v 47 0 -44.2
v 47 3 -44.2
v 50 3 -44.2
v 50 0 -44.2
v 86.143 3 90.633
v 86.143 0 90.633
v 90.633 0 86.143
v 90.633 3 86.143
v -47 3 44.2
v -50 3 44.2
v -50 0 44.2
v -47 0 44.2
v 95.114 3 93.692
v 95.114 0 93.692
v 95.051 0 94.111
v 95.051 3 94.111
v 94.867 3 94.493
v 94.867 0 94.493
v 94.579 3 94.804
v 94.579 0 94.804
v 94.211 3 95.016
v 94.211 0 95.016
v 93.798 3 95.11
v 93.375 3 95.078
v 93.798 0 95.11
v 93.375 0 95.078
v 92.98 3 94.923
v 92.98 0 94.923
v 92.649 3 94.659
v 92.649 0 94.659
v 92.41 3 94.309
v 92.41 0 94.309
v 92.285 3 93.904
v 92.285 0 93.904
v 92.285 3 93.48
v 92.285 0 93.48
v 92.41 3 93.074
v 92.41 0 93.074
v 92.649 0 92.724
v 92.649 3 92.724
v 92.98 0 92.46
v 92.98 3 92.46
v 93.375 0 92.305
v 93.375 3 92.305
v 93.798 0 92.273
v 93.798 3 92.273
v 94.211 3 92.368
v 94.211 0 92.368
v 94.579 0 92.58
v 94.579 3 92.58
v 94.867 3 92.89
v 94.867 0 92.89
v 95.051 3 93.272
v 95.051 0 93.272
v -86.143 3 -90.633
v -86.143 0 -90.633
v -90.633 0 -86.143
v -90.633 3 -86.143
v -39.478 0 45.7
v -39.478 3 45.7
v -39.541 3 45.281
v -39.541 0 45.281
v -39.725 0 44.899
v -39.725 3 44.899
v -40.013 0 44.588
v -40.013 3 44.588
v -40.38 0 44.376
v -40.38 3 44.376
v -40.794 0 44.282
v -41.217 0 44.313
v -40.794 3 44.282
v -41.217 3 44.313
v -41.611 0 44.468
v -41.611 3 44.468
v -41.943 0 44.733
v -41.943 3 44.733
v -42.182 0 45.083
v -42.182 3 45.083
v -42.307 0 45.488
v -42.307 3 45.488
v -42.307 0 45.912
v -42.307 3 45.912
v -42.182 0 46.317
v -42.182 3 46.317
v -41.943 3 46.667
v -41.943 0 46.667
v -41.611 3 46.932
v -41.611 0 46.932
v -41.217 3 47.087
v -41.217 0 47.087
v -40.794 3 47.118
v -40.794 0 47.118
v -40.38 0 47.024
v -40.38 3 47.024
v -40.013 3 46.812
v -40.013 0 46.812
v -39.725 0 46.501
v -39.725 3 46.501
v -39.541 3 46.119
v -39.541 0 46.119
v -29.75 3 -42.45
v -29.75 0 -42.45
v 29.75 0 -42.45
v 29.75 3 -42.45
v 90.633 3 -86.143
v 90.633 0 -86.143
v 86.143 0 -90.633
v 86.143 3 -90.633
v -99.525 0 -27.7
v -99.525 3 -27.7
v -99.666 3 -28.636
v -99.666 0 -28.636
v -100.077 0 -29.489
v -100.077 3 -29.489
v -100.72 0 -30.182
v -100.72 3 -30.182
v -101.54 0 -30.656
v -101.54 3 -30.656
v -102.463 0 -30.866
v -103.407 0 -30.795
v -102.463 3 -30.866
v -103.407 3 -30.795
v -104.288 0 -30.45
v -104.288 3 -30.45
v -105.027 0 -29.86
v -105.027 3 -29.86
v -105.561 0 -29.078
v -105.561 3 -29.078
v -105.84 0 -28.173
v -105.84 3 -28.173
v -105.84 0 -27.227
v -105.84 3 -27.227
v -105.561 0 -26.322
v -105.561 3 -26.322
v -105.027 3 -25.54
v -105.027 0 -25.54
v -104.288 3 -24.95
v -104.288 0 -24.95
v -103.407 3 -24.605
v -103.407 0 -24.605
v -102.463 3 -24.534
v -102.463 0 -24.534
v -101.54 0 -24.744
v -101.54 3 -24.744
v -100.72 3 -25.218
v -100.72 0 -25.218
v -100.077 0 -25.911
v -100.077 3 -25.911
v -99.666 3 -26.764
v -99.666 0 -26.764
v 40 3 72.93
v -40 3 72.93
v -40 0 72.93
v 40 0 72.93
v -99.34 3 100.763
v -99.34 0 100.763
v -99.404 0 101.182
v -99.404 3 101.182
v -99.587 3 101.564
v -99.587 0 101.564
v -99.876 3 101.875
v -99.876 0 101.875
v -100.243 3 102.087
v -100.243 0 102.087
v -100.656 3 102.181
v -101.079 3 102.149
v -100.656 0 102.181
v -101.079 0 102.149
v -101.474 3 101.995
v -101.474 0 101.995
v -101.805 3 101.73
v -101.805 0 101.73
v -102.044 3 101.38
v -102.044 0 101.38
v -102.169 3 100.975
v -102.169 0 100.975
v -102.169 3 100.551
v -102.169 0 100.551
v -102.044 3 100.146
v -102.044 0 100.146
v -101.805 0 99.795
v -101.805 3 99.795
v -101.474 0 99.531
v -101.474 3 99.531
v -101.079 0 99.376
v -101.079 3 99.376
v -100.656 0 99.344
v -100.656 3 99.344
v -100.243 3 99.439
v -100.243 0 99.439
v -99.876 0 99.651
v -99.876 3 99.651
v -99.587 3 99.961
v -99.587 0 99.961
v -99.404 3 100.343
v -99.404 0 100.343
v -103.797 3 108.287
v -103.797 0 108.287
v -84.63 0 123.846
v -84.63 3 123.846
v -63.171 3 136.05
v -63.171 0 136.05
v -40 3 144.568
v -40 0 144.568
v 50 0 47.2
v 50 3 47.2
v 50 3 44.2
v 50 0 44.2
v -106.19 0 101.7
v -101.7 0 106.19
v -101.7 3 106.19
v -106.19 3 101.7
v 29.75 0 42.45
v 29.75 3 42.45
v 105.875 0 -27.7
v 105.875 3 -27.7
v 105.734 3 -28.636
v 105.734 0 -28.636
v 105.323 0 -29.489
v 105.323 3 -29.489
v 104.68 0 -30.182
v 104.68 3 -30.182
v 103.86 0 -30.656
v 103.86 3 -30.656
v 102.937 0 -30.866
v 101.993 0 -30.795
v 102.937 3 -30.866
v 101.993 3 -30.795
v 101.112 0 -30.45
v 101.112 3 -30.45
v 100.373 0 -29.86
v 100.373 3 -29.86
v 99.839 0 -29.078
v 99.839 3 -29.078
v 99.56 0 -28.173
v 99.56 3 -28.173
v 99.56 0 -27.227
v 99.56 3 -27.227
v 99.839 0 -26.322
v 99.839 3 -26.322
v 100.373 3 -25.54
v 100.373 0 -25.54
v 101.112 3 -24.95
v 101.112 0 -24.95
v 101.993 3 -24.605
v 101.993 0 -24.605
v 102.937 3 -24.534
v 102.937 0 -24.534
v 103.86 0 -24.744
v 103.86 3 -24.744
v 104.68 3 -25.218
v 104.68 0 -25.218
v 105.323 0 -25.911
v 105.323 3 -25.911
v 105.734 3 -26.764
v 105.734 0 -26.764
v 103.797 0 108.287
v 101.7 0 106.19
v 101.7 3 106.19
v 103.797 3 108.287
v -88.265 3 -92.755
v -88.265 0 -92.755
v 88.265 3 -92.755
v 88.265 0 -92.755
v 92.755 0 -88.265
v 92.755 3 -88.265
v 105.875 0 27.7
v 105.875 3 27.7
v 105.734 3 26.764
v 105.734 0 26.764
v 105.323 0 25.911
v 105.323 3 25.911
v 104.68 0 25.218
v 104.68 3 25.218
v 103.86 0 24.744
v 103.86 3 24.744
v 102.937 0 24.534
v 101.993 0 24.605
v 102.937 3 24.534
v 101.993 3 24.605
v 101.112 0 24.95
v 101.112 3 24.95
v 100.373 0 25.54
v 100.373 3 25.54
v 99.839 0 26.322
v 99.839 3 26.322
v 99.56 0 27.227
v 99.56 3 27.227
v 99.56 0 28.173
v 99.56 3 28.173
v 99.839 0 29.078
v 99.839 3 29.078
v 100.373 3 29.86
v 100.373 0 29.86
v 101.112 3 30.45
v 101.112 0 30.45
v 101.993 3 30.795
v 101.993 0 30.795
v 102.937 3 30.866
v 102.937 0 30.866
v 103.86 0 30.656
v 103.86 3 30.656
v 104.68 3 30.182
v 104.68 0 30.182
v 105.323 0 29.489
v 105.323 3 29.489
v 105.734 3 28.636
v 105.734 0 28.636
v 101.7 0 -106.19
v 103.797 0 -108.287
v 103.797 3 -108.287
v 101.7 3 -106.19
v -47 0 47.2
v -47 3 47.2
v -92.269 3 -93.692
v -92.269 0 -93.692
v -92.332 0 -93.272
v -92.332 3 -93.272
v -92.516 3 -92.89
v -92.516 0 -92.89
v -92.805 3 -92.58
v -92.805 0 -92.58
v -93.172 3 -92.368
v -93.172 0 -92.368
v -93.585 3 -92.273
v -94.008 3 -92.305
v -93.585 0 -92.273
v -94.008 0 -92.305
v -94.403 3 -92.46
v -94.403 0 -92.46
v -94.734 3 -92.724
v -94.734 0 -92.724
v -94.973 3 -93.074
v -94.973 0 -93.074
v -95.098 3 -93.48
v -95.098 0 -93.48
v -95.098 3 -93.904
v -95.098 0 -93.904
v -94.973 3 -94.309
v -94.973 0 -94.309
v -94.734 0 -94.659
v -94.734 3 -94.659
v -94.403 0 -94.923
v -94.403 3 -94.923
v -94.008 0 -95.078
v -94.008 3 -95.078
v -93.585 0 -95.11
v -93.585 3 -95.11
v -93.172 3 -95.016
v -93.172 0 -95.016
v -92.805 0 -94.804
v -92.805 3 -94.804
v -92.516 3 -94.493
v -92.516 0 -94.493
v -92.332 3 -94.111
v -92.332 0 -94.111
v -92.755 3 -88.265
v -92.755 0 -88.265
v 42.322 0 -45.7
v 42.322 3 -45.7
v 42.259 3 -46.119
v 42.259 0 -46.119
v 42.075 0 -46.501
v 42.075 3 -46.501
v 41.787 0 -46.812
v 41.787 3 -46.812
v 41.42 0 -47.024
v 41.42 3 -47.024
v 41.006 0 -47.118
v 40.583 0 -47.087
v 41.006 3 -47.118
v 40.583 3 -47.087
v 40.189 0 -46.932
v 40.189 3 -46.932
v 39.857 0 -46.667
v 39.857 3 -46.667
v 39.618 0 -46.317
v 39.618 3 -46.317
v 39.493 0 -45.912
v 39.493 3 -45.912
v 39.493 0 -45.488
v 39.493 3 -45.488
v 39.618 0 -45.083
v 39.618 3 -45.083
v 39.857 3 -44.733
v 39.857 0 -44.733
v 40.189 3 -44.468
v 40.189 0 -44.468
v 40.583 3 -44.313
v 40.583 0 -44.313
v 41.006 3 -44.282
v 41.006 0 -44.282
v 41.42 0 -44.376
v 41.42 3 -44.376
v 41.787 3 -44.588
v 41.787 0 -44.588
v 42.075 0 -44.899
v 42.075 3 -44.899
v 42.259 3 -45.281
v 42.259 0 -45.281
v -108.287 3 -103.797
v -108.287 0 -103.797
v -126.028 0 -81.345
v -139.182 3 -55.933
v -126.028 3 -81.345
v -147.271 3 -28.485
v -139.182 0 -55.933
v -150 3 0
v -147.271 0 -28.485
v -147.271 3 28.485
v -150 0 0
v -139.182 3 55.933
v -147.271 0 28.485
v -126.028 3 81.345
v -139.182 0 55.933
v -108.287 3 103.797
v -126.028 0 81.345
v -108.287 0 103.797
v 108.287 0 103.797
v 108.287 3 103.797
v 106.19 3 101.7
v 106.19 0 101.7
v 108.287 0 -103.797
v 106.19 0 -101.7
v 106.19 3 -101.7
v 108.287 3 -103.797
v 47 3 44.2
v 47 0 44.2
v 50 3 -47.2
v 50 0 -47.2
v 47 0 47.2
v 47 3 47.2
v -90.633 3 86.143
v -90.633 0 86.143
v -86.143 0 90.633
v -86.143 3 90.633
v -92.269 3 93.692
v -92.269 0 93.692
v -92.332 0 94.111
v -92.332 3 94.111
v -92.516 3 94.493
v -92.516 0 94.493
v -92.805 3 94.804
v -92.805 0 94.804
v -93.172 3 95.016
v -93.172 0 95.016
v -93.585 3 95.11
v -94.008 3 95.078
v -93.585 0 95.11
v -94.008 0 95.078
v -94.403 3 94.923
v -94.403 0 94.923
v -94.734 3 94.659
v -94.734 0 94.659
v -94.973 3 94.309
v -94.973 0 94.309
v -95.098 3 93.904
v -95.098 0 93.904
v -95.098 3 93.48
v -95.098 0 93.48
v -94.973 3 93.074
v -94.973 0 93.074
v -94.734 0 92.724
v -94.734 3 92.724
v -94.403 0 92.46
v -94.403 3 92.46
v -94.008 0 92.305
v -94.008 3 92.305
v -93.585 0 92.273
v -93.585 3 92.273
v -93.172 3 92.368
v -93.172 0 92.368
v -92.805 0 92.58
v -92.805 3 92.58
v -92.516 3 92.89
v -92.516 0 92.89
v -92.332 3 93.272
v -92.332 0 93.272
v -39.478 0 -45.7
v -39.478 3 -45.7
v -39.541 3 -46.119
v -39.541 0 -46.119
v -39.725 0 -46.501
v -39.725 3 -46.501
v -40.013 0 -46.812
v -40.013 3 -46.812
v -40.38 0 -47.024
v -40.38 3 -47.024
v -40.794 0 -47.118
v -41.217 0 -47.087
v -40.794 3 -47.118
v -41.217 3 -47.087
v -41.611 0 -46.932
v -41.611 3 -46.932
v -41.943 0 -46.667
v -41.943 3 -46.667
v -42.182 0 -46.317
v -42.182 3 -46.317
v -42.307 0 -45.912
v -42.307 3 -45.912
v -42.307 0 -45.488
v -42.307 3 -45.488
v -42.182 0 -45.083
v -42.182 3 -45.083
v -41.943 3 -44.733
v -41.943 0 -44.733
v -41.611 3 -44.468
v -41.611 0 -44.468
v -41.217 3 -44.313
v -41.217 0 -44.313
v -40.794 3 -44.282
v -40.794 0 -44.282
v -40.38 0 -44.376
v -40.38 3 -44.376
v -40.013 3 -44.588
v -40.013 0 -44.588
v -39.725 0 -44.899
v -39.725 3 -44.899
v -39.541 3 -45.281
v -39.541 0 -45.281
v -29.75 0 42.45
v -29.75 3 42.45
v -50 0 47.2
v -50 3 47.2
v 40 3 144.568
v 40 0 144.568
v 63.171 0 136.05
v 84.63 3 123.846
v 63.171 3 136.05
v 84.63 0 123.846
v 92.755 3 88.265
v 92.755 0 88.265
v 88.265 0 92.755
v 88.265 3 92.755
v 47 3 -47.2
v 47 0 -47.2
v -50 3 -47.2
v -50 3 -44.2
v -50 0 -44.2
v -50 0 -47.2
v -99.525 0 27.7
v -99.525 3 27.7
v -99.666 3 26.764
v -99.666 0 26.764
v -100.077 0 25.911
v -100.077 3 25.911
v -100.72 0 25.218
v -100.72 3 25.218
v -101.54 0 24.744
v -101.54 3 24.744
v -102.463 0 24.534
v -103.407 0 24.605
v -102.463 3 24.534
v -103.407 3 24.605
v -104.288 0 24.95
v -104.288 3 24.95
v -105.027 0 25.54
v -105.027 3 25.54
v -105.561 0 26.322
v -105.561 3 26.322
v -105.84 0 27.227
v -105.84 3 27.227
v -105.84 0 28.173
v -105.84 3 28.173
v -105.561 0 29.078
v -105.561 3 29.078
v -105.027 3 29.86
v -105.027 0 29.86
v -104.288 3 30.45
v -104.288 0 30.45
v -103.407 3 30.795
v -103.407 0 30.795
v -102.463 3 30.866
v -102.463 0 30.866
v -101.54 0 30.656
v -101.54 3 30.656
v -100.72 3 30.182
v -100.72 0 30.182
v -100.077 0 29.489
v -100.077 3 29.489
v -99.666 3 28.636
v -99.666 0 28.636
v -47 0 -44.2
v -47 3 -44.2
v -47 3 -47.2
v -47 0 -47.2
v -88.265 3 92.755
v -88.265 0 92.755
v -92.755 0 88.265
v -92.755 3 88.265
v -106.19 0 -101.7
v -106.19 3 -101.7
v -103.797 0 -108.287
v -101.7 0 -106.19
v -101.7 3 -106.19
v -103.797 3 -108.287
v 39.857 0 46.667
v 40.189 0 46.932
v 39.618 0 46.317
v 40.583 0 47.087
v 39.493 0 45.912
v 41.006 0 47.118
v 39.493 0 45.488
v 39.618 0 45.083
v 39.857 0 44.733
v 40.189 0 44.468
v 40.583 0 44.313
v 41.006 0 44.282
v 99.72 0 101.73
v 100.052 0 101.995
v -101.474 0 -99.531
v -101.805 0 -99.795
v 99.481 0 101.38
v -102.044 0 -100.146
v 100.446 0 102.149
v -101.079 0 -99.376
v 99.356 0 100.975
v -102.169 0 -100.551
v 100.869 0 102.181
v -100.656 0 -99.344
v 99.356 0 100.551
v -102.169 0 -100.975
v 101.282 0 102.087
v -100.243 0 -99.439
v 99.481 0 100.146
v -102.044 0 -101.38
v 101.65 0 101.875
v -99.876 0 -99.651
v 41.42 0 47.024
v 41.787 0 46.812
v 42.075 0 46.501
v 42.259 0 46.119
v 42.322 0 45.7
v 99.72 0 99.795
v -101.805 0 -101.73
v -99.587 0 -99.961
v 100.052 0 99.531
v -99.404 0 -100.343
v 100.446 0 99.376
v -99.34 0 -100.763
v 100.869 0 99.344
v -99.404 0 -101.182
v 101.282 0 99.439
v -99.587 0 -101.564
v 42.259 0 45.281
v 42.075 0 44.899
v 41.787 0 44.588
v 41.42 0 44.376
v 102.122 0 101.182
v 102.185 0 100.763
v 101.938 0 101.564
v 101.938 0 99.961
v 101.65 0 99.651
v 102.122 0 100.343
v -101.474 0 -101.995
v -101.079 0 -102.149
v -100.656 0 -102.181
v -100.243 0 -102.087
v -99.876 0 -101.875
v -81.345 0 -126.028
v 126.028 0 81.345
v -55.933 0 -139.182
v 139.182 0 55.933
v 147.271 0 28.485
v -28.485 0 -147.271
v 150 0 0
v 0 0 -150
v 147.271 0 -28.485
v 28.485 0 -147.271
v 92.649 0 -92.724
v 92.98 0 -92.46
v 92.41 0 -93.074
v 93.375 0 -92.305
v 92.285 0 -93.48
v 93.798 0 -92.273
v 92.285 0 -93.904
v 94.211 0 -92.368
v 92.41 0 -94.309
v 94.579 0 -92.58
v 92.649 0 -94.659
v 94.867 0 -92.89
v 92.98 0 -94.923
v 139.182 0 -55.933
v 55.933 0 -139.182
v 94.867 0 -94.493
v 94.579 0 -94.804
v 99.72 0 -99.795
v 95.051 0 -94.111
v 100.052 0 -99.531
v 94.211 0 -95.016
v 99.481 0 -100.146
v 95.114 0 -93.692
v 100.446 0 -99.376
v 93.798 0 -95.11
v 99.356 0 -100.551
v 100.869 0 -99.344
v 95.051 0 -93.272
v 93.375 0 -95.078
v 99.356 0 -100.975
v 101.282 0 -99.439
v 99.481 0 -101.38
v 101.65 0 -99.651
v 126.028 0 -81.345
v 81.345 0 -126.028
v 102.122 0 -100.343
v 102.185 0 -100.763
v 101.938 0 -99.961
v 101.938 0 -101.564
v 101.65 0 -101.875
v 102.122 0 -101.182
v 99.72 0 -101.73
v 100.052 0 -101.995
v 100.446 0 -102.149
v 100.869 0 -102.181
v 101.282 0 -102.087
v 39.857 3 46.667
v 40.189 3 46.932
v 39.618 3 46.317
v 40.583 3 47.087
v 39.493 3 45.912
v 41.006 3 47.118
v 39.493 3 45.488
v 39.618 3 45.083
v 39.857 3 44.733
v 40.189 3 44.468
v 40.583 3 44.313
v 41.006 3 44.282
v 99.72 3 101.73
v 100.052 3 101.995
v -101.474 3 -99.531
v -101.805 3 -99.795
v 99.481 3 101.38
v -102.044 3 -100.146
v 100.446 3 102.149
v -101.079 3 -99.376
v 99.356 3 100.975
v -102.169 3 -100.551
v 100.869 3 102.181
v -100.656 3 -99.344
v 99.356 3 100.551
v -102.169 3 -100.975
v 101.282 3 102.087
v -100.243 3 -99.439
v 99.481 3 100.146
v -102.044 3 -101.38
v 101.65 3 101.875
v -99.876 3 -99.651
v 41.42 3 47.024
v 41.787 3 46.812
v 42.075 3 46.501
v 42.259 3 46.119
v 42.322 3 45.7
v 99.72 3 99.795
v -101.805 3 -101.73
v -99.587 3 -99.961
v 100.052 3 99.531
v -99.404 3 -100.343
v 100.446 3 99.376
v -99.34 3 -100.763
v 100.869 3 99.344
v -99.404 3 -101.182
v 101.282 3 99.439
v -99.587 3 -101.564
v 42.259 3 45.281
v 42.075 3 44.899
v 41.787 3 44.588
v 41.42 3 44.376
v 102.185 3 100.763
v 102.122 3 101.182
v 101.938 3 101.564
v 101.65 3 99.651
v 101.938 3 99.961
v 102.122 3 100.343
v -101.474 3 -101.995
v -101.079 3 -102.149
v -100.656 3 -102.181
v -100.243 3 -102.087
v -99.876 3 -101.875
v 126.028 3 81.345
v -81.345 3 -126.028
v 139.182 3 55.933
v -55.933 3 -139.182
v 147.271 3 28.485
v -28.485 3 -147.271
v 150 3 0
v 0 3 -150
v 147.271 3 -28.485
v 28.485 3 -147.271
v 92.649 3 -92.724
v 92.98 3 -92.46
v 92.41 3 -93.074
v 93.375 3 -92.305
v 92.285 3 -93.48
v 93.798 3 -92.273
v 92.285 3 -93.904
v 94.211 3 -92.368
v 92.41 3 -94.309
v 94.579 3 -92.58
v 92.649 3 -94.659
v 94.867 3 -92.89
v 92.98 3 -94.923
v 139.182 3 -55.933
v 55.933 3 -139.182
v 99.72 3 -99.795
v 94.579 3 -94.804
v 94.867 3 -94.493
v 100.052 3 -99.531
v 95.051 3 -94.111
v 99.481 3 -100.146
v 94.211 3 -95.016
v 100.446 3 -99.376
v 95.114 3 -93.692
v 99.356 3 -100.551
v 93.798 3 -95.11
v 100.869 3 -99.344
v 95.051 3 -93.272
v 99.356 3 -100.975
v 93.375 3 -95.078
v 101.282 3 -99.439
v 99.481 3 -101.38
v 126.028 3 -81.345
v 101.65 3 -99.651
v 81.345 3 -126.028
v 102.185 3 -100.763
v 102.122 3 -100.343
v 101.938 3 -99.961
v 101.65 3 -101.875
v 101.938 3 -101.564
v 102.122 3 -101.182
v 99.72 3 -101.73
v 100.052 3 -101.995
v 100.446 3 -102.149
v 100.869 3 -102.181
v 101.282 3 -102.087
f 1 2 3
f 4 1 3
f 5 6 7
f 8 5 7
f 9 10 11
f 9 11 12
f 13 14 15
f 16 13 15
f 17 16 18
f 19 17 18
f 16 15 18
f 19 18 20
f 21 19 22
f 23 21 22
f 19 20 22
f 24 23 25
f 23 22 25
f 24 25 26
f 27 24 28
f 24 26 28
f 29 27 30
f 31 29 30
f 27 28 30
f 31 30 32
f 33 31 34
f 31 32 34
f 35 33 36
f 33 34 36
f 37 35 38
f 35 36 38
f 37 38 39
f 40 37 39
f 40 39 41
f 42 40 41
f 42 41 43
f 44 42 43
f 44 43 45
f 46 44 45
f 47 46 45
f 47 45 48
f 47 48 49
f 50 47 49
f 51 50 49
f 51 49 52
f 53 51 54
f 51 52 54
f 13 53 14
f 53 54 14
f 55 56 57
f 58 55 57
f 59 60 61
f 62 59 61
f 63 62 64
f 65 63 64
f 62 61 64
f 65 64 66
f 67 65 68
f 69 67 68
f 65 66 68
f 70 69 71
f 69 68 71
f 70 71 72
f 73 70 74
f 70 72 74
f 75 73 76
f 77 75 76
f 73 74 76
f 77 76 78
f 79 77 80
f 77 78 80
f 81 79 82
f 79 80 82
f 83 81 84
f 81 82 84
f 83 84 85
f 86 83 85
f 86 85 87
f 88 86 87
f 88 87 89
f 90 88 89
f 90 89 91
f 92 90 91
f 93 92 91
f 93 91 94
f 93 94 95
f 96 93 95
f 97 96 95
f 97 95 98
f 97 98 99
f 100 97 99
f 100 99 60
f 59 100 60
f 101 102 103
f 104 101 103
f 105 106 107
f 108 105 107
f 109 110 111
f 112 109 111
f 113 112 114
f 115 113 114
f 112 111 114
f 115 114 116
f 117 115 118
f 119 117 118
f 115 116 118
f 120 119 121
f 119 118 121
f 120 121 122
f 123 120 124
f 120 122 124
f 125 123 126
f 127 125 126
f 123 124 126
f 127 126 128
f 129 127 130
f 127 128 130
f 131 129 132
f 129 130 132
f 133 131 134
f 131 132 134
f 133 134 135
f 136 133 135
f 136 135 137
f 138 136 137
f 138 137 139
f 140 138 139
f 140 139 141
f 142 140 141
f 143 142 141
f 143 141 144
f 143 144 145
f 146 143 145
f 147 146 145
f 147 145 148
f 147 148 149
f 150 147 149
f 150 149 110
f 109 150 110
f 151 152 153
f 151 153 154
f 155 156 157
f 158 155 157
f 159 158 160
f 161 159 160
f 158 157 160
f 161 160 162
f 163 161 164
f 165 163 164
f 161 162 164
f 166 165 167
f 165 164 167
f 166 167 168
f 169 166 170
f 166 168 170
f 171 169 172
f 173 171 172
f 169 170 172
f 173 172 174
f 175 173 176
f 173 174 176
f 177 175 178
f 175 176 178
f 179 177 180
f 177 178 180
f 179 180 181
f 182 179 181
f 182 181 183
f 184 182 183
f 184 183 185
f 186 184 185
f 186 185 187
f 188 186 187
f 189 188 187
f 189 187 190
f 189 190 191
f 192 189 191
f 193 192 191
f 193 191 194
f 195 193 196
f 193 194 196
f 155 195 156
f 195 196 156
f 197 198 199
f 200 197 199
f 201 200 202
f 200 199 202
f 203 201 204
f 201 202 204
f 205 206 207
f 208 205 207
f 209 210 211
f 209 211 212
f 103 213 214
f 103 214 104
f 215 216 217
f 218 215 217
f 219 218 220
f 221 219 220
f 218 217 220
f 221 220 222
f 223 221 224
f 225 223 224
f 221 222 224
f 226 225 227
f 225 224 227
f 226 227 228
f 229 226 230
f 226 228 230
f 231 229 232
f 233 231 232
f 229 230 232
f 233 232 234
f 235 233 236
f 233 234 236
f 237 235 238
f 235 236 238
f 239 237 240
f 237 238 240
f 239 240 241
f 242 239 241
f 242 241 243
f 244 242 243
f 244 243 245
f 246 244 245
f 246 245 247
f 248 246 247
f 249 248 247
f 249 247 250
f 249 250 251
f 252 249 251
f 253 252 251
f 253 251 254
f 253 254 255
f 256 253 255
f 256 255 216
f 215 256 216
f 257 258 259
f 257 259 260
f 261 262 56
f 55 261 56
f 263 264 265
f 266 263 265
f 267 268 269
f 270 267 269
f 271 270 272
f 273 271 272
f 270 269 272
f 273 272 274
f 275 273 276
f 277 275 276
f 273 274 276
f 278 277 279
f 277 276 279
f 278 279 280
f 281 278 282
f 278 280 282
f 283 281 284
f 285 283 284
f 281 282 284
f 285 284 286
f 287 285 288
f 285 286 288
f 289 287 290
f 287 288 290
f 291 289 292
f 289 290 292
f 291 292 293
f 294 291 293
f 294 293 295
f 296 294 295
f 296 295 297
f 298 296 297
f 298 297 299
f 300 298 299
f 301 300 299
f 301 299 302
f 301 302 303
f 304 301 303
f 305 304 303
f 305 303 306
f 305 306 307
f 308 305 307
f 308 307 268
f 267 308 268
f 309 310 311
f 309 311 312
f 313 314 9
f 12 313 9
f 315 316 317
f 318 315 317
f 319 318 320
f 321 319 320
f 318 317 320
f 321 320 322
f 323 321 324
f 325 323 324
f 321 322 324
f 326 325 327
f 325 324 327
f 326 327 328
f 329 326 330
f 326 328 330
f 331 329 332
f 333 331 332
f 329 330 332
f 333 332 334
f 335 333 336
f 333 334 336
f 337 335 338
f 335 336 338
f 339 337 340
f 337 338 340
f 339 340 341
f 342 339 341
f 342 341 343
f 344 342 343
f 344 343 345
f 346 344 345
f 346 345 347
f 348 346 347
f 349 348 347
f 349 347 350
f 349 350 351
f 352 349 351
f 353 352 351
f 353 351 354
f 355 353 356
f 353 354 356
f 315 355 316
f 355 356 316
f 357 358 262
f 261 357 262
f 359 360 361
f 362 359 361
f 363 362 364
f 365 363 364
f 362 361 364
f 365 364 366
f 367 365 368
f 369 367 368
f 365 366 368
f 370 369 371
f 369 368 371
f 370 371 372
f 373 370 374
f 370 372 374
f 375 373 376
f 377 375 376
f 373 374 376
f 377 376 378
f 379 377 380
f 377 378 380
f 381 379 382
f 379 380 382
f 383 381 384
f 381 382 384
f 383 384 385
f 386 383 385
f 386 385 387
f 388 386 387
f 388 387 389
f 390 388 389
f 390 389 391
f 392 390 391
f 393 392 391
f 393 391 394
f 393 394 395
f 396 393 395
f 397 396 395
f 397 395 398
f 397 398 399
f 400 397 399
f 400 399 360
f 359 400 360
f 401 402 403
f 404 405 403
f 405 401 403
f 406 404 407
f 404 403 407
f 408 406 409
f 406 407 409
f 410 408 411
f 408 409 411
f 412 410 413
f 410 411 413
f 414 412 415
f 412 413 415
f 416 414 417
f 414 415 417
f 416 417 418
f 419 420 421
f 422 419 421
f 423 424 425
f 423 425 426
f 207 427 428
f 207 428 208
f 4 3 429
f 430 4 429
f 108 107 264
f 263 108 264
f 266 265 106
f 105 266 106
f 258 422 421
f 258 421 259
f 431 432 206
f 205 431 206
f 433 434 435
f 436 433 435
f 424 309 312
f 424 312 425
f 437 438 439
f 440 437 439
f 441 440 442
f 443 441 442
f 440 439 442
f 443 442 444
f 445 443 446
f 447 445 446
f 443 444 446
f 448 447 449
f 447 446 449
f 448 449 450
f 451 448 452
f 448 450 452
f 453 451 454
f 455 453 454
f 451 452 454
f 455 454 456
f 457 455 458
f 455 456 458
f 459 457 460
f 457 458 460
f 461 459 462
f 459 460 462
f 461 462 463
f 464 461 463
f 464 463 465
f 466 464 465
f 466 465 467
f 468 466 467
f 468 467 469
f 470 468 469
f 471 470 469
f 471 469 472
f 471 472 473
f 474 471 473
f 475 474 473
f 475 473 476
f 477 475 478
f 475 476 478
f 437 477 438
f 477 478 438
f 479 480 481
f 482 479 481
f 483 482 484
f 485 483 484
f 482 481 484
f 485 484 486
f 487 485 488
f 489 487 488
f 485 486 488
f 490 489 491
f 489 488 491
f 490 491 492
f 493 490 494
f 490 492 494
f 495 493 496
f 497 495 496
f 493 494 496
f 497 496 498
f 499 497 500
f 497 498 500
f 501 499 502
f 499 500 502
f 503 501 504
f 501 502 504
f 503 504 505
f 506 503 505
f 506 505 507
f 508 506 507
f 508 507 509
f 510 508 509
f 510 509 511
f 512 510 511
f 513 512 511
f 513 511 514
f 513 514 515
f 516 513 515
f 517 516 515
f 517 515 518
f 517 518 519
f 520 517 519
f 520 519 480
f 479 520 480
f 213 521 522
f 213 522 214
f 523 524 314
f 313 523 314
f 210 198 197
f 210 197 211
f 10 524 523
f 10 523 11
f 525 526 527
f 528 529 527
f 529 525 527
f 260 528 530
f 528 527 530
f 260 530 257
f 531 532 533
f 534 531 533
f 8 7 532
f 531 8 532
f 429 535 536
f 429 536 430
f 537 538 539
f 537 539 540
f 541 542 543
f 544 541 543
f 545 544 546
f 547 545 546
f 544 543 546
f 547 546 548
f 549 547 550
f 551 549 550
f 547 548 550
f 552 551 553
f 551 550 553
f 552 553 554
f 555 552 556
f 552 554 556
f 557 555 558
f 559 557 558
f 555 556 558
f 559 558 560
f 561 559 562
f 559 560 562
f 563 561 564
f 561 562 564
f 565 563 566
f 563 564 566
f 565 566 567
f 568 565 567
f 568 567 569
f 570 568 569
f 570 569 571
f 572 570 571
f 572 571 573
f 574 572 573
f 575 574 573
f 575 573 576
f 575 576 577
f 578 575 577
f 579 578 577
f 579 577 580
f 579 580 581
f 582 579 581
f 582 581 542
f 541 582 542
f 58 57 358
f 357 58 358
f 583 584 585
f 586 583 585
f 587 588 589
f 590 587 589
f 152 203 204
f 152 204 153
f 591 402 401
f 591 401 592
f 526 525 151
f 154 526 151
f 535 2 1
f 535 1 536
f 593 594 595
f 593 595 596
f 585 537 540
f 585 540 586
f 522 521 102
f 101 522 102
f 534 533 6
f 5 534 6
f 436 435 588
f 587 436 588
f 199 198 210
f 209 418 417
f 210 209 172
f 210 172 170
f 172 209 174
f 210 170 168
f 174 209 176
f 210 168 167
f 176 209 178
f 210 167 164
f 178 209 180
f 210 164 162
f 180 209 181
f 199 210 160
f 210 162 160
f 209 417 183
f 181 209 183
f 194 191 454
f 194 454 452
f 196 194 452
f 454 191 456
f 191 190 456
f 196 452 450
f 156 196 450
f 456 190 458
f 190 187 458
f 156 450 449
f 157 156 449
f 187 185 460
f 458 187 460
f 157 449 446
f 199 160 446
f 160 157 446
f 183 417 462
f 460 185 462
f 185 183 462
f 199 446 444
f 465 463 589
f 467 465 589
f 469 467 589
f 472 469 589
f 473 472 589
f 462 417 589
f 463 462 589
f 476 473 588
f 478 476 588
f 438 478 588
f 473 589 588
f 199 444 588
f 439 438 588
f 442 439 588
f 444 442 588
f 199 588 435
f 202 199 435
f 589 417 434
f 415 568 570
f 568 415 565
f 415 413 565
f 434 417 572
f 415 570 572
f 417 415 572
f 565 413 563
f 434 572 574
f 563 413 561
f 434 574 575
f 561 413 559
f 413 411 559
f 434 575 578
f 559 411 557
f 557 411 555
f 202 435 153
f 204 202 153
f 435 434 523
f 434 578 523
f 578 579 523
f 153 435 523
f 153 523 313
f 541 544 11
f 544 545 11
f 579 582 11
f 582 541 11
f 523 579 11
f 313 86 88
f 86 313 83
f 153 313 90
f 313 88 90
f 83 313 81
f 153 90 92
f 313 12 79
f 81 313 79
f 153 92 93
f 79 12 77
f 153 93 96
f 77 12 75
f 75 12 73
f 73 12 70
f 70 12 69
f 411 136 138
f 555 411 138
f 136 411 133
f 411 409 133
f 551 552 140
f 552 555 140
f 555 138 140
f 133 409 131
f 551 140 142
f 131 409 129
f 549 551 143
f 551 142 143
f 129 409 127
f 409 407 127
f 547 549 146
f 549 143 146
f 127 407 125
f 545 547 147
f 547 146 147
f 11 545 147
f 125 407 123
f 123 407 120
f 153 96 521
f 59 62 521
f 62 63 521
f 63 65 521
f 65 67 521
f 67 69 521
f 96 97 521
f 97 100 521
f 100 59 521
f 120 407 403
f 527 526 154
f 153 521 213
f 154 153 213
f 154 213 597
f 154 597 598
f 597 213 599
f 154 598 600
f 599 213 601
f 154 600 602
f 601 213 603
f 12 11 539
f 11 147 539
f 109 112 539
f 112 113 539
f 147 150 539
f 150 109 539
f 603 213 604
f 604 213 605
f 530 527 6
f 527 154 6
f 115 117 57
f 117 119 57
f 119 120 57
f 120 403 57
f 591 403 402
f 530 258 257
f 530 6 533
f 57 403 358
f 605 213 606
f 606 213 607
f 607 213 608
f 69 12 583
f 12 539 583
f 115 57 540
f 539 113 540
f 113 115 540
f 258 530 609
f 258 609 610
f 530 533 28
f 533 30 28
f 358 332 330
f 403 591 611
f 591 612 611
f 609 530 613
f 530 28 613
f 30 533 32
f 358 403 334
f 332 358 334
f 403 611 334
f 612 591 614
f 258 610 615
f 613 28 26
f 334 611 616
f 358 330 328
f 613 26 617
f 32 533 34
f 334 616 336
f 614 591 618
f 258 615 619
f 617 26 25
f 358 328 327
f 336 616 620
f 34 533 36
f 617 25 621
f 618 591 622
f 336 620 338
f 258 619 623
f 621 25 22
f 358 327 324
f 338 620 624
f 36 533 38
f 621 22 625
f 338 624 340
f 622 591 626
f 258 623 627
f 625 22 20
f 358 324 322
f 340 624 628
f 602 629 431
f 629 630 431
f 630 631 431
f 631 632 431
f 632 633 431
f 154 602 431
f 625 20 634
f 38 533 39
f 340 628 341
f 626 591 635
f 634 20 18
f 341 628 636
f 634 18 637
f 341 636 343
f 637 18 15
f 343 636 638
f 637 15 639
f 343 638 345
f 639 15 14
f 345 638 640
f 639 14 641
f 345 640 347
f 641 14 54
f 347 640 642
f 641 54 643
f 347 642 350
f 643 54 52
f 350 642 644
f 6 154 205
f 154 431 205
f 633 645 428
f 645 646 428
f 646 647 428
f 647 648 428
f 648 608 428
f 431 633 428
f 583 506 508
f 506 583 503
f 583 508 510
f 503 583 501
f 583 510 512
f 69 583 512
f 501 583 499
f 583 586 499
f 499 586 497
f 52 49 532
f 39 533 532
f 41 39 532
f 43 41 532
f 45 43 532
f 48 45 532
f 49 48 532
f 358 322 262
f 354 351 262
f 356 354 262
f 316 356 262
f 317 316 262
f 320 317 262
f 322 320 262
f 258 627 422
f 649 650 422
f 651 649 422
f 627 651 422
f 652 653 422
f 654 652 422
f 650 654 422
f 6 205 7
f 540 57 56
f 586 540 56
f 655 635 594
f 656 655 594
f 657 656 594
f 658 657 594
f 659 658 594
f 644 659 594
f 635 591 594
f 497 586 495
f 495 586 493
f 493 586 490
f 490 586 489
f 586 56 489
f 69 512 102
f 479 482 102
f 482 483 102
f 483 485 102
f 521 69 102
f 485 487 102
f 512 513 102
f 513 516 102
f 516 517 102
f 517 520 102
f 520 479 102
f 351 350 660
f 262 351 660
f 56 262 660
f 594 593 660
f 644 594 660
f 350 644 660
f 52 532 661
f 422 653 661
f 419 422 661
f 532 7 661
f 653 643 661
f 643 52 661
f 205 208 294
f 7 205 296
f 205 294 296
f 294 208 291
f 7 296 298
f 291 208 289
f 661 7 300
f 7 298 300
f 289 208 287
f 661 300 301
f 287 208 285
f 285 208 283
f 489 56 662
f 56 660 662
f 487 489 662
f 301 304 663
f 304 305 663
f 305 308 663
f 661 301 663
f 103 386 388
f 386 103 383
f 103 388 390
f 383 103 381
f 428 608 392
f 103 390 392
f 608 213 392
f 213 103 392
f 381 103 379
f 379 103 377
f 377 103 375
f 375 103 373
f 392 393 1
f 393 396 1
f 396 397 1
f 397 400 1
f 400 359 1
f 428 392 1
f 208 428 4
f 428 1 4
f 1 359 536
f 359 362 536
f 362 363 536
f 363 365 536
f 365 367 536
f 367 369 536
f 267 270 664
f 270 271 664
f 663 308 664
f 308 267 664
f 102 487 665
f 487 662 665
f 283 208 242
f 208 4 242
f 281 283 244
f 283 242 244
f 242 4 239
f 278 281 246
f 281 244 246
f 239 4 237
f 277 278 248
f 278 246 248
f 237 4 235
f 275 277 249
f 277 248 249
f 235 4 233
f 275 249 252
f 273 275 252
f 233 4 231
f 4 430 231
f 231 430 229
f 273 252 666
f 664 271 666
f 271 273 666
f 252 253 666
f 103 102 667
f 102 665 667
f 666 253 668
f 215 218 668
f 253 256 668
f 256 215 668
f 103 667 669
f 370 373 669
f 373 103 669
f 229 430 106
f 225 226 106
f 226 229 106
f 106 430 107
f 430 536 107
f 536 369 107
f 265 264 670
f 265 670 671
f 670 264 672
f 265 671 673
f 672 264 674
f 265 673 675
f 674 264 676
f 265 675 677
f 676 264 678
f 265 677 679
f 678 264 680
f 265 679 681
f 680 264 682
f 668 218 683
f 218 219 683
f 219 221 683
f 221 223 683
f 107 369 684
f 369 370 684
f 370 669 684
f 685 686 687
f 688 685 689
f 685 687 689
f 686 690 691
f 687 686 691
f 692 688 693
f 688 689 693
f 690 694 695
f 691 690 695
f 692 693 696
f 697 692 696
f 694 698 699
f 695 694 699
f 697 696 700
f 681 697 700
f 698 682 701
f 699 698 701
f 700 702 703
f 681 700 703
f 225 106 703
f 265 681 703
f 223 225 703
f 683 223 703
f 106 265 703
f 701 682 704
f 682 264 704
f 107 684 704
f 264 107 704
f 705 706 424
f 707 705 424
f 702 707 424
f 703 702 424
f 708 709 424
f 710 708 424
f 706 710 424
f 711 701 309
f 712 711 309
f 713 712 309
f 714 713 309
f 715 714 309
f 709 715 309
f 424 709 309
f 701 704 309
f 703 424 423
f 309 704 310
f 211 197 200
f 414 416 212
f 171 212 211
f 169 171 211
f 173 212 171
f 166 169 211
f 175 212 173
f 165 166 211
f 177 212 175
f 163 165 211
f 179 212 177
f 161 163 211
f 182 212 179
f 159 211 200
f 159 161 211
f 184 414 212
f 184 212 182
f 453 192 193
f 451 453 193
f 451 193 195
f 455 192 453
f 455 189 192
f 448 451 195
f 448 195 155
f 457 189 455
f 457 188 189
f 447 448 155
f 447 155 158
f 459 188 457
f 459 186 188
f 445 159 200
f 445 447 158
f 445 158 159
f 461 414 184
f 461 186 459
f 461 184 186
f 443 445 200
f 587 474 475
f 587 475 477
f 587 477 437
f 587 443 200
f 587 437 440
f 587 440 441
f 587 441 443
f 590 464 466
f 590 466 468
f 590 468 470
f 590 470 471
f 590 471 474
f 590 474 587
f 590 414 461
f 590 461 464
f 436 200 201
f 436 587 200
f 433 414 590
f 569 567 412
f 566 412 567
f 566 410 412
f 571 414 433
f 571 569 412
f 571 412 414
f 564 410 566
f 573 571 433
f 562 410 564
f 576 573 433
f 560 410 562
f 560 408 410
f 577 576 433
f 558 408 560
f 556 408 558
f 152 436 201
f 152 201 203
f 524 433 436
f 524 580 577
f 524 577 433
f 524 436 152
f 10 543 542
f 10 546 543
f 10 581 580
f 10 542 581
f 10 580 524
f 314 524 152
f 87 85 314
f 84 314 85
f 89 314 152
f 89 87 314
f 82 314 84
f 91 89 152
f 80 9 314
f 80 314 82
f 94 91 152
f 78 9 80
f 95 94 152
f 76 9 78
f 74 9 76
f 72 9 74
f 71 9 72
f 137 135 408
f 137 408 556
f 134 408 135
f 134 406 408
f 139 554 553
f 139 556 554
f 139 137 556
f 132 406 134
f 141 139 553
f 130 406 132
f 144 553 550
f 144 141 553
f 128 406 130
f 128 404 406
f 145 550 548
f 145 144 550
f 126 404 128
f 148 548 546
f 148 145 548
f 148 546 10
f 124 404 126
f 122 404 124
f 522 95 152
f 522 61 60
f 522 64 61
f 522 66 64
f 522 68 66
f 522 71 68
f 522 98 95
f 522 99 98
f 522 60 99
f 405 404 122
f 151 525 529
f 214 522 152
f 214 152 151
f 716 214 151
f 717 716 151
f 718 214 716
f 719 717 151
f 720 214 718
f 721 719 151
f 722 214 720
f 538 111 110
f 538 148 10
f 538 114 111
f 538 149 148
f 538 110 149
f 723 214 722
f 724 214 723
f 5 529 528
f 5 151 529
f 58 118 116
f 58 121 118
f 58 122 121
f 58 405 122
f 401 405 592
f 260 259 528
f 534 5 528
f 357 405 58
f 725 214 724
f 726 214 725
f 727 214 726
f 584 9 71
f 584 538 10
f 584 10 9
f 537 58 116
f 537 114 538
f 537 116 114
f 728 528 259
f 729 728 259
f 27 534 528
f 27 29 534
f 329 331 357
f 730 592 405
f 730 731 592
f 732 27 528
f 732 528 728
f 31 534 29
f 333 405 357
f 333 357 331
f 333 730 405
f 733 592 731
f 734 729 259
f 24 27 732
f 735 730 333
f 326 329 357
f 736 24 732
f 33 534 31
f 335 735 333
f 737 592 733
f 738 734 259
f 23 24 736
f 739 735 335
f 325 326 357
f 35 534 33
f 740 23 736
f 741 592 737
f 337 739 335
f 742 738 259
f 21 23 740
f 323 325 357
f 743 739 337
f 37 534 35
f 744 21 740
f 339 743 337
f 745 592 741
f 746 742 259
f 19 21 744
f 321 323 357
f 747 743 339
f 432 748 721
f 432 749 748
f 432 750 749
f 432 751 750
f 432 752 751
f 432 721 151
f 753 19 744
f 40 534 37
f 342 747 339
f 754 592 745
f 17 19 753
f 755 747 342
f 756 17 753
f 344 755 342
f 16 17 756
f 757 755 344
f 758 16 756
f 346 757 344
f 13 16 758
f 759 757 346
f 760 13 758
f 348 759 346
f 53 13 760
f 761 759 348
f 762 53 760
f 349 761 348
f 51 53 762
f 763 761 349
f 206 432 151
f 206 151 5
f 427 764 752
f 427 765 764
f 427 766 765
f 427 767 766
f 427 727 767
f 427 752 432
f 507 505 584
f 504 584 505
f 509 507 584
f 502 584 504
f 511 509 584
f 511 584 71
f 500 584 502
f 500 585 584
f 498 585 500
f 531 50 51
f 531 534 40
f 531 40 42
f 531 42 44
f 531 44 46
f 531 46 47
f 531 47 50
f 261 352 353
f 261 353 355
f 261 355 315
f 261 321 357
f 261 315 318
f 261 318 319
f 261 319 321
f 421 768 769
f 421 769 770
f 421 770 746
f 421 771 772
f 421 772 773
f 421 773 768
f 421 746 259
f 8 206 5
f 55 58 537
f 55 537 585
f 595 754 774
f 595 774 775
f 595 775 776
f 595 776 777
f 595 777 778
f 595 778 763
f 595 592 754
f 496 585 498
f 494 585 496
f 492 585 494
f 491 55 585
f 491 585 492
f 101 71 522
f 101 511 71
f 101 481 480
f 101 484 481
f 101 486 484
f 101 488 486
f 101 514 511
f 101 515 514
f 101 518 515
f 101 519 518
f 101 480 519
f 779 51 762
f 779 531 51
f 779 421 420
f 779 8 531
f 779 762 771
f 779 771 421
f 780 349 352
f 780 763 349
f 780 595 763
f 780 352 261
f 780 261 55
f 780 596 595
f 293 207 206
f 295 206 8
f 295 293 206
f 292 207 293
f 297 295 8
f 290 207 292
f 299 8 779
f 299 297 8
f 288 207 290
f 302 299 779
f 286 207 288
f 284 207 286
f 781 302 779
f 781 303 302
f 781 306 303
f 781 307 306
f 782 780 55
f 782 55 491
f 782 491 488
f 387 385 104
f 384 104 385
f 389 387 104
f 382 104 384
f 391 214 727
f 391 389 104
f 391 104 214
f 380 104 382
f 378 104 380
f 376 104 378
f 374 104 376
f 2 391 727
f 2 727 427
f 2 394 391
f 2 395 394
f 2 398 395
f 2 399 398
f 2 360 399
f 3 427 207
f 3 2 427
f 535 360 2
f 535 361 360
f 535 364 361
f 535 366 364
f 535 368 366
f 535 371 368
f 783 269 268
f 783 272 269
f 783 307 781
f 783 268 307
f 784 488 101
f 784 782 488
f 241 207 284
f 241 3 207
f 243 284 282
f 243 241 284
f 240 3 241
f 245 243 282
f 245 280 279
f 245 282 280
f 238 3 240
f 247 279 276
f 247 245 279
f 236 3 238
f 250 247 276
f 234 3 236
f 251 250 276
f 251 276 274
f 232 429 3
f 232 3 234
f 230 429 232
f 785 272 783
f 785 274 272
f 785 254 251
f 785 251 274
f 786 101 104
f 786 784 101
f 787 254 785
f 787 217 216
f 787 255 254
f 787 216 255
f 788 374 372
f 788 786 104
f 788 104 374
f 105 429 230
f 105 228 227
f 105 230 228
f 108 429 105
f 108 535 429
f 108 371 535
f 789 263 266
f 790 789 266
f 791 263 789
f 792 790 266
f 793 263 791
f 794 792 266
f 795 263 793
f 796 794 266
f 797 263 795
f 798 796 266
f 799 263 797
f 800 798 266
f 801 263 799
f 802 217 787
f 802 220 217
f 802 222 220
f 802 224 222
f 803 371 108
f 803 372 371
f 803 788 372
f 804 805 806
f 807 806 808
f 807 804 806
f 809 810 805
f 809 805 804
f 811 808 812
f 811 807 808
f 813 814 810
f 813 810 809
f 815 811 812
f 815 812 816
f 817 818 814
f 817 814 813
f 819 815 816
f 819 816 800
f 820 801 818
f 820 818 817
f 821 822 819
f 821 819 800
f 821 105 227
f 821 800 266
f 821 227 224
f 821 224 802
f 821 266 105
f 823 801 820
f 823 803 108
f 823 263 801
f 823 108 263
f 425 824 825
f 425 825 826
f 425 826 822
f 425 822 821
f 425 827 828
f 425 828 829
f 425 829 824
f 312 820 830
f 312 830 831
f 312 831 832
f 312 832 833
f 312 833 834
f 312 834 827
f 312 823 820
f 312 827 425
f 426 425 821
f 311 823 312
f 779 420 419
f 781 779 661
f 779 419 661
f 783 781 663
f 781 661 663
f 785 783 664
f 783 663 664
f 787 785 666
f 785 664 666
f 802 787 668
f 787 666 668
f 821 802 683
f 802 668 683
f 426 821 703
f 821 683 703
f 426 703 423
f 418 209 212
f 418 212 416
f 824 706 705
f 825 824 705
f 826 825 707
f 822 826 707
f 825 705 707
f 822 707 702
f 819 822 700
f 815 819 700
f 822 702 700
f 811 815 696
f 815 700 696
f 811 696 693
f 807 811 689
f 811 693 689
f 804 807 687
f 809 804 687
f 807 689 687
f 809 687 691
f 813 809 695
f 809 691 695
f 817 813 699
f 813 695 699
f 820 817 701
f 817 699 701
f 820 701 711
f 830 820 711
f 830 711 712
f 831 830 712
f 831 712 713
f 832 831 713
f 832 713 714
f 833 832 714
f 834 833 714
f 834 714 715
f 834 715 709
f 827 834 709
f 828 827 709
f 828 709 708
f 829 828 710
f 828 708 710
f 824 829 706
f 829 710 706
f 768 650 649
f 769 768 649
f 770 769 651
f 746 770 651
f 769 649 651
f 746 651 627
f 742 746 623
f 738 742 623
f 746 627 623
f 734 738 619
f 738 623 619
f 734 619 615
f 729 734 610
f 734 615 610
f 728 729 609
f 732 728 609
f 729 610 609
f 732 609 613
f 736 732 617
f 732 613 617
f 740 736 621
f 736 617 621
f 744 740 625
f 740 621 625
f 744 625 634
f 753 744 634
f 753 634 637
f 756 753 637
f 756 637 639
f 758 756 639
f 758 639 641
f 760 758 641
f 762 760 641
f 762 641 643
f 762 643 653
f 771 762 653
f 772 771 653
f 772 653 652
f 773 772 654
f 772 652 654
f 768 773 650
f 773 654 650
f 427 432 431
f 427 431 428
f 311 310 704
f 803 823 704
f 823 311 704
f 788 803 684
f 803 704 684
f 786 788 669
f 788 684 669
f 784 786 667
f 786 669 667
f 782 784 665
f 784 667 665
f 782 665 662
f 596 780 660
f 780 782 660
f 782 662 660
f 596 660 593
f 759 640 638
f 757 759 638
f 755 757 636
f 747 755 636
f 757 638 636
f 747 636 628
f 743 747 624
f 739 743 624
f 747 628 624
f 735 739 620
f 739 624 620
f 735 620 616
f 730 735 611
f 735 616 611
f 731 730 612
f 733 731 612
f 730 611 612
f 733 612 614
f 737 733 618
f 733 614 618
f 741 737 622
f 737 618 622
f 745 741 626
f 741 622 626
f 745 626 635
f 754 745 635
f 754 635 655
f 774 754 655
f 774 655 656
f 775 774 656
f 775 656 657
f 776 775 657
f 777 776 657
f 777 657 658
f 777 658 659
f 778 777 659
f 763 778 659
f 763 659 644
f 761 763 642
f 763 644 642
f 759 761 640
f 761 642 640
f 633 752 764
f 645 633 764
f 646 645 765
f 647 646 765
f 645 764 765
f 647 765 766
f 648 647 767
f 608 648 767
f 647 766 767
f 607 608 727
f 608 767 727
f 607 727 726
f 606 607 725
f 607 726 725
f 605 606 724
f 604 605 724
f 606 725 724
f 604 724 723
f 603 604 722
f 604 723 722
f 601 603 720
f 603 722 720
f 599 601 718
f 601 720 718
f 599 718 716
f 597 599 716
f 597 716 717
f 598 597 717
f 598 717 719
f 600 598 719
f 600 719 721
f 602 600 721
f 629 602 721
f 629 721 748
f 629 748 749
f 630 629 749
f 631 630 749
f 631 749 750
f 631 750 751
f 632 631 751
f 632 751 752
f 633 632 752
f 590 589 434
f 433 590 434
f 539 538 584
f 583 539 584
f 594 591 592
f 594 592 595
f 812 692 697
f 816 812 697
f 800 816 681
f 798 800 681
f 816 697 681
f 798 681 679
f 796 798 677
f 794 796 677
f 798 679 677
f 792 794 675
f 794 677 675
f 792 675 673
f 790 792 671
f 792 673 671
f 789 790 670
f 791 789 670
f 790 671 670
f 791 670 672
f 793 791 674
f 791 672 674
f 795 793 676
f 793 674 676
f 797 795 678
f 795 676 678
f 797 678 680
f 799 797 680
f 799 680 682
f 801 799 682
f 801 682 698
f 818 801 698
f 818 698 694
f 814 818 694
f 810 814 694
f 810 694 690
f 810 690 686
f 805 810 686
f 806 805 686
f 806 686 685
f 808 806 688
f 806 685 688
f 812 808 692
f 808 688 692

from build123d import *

# Parameters (mm, degrees)
SKETCH1_R           = 150
SKETCH1_W           = 59.5
SKETCH1_H           = 84.9
BOSS_EXTRUDE1_DEPTH = 3
SKETCH3_R           = 1.4224
SKETCH3_R_2         = 3.175
SKETCH3_W           = 3
SKETCH3_H           = 3
CUT_EXTRUDE1_DEPTH  = 10
SKETCH6_W           = 80
SKETCH6_H           = 88.399519522
CUT_EXTRUDE3_DEPTH  = 3
SKETCH8_R           = 1.4224
CUT_EXTRUDE5_DEPTH  = 3


with BuildPart() as part:
    # Sketch1 → Boss-Extrude1 (new body)
    with BuildSketch(Plane(origin=(0, 0, 0), x_dir=(1, 0, 0), z_dir=(0, 1, 0))):
        Circle(SKETCH1_R)
        Rectangle(SKETCH1_W, SKETCH1_H, mode=Mode.SUBTRACT)
    extrude(amount=BOSS_EXTRUDE1_DEPTH)

    # Sketch3 → Cut-Extrude1 (cut)
    with BuildSketch(Plane(origin=(0, 3, 0), x_dir=(1, 0, 0), z_dir=(0, 1, 0))):
        with Locations((-40.9, 45.7)):
            Circle(SKETCH3_R)
        with Locations((40.9, 45.7)):
            Circle(SKETCH3_R)
        with Locations((40.9, -45.7)):
            Circle(SKETCH3_R)
        with Locations((-40.9, -45.7)):
            Circle(SKETCH3_R)
        with Locations((-102.7, 27.7)):
            Circle(SKETCH3_R_2)
        with Locations((-102.7, -27.7)):
            Circle(SKETCH3_R_2)
        with Locations((102.7, 27.7)):
            Circle(SKETCH3_R_2)
        with Locations((102.7, -27.7)):
            Circle(SKETCH3_R_2)
        with Locations((-48.5, 45.7)):
            Rectangle(SKETCH3_W, SKETCH3_H)
        with Locations((48.5, 45.7)):
            Rectangle(SKETCH3_W, SKETCH3_H)
        with Locations((48.5, -45.7)):
            Rectangle(SKETCH3_W, SKETCH3_H)
        with Locations((-48.5, -45.7)):
            Rectangle(SKETCH3_W, SKETCH3_H)
    extrude(amount=-CUT_EXTRUDE1_DEPTH, mode=Mode.SUBTRACT)

    # Sketch6 → Cut-Extrude3 (cut)
    with BuildSketch(Plane(origin=(0, 3, 0), x_dir=(1, 0, 0), z_dir=(0, 1, 0))):
        with Locations((0, -117.129759761)):
            Rectangle(SKETCH6_W, SKETCH6_H)
    extrude(amount=-CUT_EXTRUDE3_DEPTH, mode=Mode.SUBTRACT)

    # Sketch8 → Cut-Extrude5 (cut)
    with BuildSketch(Plane.XZ):
        with Locations((100.762716319, 100.762716319)):
            Circle(SKETCH8_R)
        with Locations((93.691648507, 93.691648507)):
            Circle(SKETCH8_R)
        with Locations((100.762716319, -100.762716319)):
            Circle(SKETCH8_R)
        with Locations((93.691648507, -93.691648507)):
            Circle(SKETCH8_R)
        with Locations((-100.762716319, -100.762716319)):
            Circle(SKETCH8_R)
        with Locations((-93.691648507, -93.691648507)):
            Circle(SKETCH8_R)
        with Locations((-100.762716319, 100.762716319)):
            Circle(SKETCH8_R)
        with Locations((-93.691648507, 93.691648507)):
            Circle(SKETCH8_R)
        Polygon((90.633411679, 86.143283618), (92.754732022, 88.264603962), (88.264603962, 92.754732022), (86.143283618, 90.633411679), align=None)
        Polygon((103.820953148, 108.311081208), (108.311081208, 103.820953148), (106.189760865, 101.699632804), (101.699632804, 106.189760865), align=None)
        Polygon((86.143283618, -90.633411679), (88.264603962, -92.754732022), (92.754732022, -88.264603962), (90.633411679, -86.143283618), align=None)
        Polygon((108.311081208, -103.820953148), (103.820953148, -108.311081208), (101.699632804, -106.189760865), (106.189760865, -101.699632804), align=None)
        Polygon((-90.633411679, -86.143283618), (-92.754732022, -88.264603962), (-88.264603962, -92.754732022), (-86.143283618, -90.633411679), align=None)
        Polygon((-103.820953148, -108.311081208), (-108.311081208, -103.820953148), (-106.189760865, -101.699632804), (-101.699632804, -106.189760865), align=None)
        Polygon((-86.143283618, 90.633411679), (-88.264603962, 92.754732022), (-92.754732022, 88.264603962), (-90.633411679, 86.143283618), align=None)
        Polygon((-108.311081208, 103.820953148), (-103.820953148, 108.311081208), (-101.699632804, 106.189760865), (-106.189760865, 101.699632804), align=None)
    extrude(amount=-CUT_EXTRUDE5_DEPTH, mode=Mode.SUBTRACT)


solid = part.part
